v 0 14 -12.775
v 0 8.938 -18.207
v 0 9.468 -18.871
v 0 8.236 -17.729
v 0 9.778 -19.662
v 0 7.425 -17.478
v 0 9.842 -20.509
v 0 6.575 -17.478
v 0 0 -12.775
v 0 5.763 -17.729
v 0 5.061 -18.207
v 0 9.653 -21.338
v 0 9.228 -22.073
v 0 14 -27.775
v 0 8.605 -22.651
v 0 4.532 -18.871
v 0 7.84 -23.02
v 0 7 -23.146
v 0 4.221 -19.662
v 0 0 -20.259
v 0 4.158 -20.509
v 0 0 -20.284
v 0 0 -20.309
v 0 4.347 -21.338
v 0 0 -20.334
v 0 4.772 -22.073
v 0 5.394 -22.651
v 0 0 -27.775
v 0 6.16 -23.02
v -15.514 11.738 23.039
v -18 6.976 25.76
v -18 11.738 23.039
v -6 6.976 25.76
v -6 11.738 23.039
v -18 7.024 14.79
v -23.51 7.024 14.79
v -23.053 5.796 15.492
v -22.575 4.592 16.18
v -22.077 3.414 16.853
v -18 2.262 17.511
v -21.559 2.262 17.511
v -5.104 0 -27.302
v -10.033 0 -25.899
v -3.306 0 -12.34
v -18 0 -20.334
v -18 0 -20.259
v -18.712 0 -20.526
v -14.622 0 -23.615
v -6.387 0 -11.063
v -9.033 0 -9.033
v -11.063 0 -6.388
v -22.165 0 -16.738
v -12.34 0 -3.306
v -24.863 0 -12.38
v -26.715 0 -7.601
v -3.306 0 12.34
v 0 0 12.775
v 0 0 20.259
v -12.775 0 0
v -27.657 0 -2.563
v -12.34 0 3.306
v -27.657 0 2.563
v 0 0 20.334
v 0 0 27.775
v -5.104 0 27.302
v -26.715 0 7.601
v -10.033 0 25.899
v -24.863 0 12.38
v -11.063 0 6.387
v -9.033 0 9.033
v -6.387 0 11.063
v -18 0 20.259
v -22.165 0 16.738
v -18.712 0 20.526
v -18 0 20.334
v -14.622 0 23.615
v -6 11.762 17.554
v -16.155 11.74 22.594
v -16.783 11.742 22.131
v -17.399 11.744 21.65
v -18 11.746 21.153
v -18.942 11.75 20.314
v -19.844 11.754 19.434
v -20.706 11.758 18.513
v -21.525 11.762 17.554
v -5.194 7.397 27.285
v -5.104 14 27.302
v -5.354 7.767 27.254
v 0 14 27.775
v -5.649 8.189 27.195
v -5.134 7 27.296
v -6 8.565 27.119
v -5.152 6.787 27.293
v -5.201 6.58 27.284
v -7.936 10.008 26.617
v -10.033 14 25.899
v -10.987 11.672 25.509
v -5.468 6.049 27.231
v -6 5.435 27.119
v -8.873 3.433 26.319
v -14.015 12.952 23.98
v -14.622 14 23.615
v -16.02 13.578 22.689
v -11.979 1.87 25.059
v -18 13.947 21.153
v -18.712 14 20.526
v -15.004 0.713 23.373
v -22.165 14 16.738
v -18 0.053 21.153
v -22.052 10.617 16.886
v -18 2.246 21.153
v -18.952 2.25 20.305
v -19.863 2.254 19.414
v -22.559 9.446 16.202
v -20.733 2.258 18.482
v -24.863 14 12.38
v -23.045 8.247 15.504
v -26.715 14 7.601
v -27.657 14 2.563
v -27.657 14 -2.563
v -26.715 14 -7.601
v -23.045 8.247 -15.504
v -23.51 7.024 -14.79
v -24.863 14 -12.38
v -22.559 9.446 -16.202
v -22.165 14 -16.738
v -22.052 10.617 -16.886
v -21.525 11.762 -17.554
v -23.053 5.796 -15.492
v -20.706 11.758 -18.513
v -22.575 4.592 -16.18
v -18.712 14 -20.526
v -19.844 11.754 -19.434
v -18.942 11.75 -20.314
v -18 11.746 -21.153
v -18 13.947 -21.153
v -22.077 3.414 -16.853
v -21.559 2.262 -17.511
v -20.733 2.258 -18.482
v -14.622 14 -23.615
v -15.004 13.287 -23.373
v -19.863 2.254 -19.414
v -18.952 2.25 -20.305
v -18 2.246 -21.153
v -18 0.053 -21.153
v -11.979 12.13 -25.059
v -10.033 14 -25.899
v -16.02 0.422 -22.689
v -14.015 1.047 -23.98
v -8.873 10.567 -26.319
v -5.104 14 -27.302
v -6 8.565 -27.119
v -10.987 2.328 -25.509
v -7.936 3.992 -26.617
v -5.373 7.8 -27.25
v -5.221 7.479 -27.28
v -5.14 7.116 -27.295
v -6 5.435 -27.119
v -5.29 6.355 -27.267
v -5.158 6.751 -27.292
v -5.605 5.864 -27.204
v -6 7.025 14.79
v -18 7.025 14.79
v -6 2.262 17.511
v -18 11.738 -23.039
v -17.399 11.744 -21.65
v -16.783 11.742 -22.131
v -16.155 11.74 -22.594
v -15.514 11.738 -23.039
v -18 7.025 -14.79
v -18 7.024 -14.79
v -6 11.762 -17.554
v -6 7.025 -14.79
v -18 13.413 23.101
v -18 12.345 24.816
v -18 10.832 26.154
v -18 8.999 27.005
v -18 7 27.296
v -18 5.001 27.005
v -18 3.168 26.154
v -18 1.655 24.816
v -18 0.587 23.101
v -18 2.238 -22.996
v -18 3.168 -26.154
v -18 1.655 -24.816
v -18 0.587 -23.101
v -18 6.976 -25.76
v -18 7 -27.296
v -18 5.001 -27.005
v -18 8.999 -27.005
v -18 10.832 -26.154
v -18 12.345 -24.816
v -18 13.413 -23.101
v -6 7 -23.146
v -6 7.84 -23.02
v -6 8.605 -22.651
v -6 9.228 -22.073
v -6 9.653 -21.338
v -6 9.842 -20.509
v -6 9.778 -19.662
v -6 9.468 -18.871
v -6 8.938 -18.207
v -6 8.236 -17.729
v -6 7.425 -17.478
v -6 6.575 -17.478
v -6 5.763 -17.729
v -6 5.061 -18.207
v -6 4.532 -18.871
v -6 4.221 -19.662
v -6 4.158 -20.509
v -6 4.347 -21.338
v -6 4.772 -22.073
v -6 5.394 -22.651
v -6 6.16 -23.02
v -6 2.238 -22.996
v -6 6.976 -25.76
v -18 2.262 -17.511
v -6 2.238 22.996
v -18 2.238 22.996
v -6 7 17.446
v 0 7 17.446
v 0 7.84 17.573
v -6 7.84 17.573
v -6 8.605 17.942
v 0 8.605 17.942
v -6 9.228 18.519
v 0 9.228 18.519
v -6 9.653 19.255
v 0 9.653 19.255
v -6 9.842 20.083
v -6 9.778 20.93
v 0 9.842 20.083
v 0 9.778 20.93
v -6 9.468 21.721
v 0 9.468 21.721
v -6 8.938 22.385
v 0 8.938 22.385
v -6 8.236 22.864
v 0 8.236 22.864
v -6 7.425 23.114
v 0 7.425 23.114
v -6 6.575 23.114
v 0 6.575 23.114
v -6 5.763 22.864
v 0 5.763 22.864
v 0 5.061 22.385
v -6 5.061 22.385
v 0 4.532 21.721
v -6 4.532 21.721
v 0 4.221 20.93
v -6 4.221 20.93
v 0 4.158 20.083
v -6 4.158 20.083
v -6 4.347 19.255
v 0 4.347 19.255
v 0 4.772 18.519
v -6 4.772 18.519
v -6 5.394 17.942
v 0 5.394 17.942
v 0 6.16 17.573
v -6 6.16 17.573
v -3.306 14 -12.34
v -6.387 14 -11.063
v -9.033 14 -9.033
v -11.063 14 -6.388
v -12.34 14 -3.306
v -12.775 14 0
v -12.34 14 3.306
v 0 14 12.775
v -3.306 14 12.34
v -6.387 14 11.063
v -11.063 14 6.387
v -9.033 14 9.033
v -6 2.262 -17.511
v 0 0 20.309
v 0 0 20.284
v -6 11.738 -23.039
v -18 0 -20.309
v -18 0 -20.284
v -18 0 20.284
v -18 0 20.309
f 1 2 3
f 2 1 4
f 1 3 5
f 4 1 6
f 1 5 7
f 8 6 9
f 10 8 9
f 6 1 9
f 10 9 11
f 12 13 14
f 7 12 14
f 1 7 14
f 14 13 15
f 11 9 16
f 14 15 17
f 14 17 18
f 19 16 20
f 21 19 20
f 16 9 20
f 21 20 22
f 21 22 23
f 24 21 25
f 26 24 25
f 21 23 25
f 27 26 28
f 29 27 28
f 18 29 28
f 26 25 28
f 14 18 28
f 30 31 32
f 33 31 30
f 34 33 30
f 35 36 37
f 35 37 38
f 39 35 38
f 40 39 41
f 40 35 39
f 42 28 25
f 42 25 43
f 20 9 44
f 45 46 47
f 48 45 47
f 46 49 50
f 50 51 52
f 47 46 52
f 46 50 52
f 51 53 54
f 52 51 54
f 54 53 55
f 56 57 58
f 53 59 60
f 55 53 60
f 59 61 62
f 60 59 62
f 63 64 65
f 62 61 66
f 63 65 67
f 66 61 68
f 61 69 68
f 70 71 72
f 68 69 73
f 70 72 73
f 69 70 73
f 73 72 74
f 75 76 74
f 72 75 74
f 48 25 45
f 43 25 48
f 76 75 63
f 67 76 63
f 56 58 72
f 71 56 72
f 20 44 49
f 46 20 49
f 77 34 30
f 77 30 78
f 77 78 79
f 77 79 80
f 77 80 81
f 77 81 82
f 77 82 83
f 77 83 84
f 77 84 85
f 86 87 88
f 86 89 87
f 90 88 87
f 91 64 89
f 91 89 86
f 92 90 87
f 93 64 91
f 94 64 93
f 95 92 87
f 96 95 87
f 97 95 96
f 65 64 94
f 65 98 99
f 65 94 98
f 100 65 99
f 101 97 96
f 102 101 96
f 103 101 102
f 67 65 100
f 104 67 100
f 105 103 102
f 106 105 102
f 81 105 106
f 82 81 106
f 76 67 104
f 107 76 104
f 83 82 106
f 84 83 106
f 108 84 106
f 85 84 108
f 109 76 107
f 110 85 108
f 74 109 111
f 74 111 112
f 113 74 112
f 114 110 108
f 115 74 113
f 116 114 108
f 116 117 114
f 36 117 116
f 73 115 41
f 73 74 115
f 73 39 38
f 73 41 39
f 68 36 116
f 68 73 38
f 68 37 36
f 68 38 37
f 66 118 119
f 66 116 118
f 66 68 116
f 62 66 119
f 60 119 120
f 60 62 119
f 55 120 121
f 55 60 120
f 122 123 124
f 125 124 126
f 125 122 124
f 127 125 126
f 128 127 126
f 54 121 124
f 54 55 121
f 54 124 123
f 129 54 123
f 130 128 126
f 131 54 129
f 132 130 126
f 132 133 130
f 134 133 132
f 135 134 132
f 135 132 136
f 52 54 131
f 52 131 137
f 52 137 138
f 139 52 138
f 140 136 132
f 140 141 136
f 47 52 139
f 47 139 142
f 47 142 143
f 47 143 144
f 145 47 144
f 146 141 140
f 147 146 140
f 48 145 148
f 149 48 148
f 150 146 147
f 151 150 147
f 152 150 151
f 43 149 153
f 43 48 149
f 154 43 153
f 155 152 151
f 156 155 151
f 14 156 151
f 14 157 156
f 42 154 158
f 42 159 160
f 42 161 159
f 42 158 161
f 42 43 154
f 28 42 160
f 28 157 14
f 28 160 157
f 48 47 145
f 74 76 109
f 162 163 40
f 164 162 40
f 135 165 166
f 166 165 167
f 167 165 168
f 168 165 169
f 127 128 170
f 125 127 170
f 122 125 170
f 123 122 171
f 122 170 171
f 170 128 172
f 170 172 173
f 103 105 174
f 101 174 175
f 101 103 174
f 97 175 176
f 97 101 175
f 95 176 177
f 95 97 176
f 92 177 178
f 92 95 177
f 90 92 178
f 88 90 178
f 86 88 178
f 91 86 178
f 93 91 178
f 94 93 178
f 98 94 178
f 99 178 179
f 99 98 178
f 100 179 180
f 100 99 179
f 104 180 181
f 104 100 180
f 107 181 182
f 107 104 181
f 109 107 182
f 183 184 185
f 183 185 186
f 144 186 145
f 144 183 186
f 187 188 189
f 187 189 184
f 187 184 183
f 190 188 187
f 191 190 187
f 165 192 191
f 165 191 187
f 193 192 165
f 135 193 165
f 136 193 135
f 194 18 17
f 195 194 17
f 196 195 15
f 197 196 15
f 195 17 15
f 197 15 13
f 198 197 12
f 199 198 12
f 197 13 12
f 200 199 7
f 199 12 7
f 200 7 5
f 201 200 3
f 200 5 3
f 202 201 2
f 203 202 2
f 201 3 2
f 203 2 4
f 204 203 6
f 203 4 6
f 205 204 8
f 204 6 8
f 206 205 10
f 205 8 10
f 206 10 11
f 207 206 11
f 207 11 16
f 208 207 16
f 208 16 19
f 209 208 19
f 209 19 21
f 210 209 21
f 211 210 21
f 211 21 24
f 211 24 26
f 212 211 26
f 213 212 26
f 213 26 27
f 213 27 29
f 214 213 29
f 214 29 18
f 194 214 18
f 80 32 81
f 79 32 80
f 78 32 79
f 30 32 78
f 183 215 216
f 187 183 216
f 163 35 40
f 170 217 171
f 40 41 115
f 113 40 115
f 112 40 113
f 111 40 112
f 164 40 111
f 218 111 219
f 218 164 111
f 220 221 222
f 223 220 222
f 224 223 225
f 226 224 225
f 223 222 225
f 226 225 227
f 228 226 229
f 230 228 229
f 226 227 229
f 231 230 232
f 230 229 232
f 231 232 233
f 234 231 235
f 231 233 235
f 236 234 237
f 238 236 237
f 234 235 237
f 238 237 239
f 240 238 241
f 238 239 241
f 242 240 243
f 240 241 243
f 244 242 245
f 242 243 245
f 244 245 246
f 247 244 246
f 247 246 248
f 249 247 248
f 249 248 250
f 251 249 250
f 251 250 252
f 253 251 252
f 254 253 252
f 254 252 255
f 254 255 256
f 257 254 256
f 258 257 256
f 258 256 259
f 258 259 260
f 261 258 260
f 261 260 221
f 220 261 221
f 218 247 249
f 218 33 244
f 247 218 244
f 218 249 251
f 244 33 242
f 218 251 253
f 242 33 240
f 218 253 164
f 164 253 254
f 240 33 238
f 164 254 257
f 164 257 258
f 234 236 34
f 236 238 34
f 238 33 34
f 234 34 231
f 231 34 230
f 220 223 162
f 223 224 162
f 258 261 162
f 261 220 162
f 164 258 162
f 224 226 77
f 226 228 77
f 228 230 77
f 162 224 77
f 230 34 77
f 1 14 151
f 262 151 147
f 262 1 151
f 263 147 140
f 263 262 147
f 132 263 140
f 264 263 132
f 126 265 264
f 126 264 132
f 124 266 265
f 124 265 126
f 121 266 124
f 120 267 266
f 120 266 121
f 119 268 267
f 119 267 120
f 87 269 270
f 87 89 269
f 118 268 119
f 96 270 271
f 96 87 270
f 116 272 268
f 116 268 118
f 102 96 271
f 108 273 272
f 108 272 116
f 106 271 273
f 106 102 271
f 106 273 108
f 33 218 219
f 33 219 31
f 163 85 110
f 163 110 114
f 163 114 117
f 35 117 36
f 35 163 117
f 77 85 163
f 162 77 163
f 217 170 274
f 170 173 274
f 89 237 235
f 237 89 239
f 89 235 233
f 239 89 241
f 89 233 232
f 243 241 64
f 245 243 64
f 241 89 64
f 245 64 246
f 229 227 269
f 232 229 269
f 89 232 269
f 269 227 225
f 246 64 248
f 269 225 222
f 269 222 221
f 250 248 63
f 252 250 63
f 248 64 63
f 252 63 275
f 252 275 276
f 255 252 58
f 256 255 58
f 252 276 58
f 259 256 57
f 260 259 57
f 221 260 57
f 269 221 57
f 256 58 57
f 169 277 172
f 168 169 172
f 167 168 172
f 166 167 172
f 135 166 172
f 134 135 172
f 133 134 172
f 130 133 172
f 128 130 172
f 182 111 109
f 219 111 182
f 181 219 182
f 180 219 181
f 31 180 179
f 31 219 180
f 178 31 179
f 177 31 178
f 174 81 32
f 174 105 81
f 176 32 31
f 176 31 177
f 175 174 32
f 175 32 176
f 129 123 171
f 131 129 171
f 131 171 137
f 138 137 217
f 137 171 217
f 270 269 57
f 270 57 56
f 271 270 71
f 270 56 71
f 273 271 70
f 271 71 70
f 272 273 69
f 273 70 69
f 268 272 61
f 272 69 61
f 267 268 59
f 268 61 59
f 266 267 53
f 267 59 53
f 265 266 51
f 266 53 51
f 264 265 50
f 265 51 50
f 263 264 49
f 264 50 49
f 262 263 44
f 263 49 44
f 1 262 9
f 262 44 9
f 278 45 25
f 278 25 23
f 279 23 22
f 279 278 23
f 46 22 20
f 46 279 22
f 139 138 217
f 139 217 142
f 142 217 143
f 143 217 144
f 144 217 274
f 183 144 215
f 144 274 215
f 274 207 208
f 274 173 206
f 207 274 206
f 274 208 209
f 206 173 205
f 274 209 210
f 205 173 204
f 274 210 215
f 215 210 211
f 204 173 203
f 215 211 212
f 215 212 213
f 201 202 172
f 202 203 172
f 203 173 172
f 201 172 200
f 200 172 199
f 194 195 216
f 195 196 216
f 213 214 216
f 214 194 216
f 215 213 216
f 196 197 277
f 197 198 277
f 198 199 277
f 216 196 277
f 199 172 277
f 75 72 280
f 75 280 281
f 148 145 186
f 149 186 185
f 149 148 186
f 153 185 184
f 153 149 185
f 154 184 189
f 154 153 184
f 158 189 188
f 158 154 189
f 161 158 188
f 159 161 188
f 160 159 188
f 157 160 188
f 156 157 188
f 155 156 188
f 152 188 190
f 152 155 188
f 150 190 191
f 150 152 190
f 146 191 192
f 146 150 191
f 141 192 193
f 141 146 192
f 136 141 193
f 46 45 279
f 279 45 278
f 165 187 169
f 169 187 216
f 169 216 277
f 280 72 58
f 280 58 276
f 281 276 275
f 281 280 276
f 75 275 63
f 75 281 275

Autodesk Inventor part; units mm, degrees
ref_plane "YZ Plane" through (0, 0, 0) normal (1, 0, 0) x (0, 1, 0)
ref_plane "XZ Plane" through (0, 0, 0) normal (0, 1, 0) x (-1, 0, 0)
ref_plane "XY Plane" through (0, 0, 0) normal (0, 0, 1) x (1, 0, 0)
sketch "Sketch1" plane through (0, 0, 0) normal (0, 1, 0) x (-1, 0, 0)
  point P0 (0, 0)
sketch "Sketch2" plane through (0, 0, 0) normal (0, 1, 0) x (-1, 0, 0)
  arc A0 (0, -12.775) -> (0, 12.775) centre (0, 0) ccw
  arc A1 (0, -27.775) -> (0, 27.775) centre (0, 0) ccw
  line L0 (0, 27.775) -> (0, -27.775)
  dimension "d0" = 25.55
  dimension "d1" = 15
extrude "Extrusion1" add sketch "Sketch2" along normal blind 14 contours A0 L0 A1
sketch "Sketch4" plane through (0, 0, 27.775) normal (1, 0, 0) x (0, 0, -1)
  line L0 (4.7364, 11.7377) -> (10.2211, 11.7622)
  line L1 (10.2211, 11.7622) -> (12.9848, 7.0245)
  line L2 (12.9848, 7.0245) -> (10.2636, 2.2623)
  line L3 (10.2636, 2.2623) -> (4.7789, 2.2378)
  line L4 (4.7789, 2.2378) -> (2.0152, 6.9755)
  line L5 (2.0152, 6.9755) -> (4.7364, 11.7377)
  line L6 (0, 14) -> (15, 14) projected
  line L7 (0, 0) -> (0, 14) projected
  line L8 (15, 14) -> (40.55, 14) projected
  line L9 (27.775, 14) -> (27.775, 0)
  line L10 (50.8136, 11.7377) -> (45.3289, 11.7622)
  line L11 (45.3289, 11.7622) -> (42.5652, 7.0245)
  line L12 (42.5652, 7.0245) -> (45.2864, 2.2623)
  line L13 (45.2864, 2.2623) -> (50.7711, 2.2378)
  line L14 (50.7711, 2.2378) -> (53.5348, 6.9755)
  line L15 (53.5348, 6.9755) -> (50.8136, 11.7377)
  line L16 (55.55, 14) -> (40.55, 14)
  line L17 (55.55, 0) -> (55.55, 14)
  line L18 (40.55, 14) -> (15, 14)
  point P0 (7.5, 7)
  point P1 (7.4787, 11.75)
  point P2 (7.5, 14)
  point P3 (0, 7)
  point P4 (48.05, 7)
  point P5 (48.0713, 11.75)
  point P6 (48.05, 14)
  point P7 (55.55, 7)
  dimension "d5" = 9.5
  dimension "d6" = 0
  dimension "d7" = 0
extrude "Extrusion2" cut sketch "Sketch4" against normal through all
sketch "Sketch5" plane through (0, 0, 27.775) normal (1, 0, 0) x (0, 0, -1)
  line L0 (4.7364, 11.7377) -> (10.2211, 11.7622) projected
  circle A0 centre (7.4787, 6.9999) radius 2.85
  line L1 (0.8522, 11.9261) -> (14.3606, 11.9261)
  line L2 (14.3606, 11.9261) -> (14.3606, 2.2036)
  line L3 (14.3606, 2.2036) -> (0.8522, 2.2036)
  line L4 (0.8522, 2.2036) -> (0.8522, 11.9261)
  line L5 (10.2636, 2.2623) -> (4.7789, 2.2378) projected
  line L6 (55.55, 14) -> (0, 14) projected
  line L7 (27.775, 14) -> (27.775, 0)
  line L8 (55.55, 0) -> (0, 0) projected
  line L9 (50.8136, 11.7377) -> (45.3289, 11.7622)
  circle A1 centre (48.0713, 6.9999) radius 2.85
  line L10 (54.6978, 11.9261) -> (41.1894, 11.9261)
  line L11 (41.1894, 11.9261) -> (41.1894, 2.2036)
  line L12 (41.1894, 2.2036) -> (54.6978, 2.2036)
  line L13 (54.6978, 2.2036) -> (54.6978, 11.9261)
  line L14 (45.2864, 2.2623) -> (50.7711, 2.2378)
  point P0 (7.4787, 11.75)
  point P1 (7.4787, 11.75)
  point P2 (48.0713, 11.75)
  point P3 (48.0713, 11.75)
  dimension "d12" = 5.7
  dimension "d13" = 0
  dimension "d14" = 4.75
extrude "Extrusion3" add sketch "Sketch5" against normal blind 6
sketch "Sketch6" plane through (-6, 0, 27.775) normal (-1, 0, 0) x (0, 0, 1)
  line L0 (-27.775, 0) -> (-27.775, 14)
  line L1 (-40.55, 14) -> (-15, 14) projected
  line L2 (-10.2636, 2.2623) -> (-4.7789, 2.2378) projected
  line L3 (-10.2636, 2.2623) -> (-4.7789, 2.2378)
  line L4 (-4.7789, 2.2378) -> (-2.0152, 6.9755) projected
  line L5 (-4.7789, 2.2378) -> (-2.0152, 6.9755)
  line L6 (-2.0152, 6.9755) -> (-4.7364, 11.7377) projected
  line L7 (-2.0152, 6.9755) -> (-4.7364, 11.7377)
  line L8 (-4.7364, 11.7377) -> (-10.2636, 11.7624)
  line L9 (-10.2636, 11.7624) -> (-13.0059, 7.0615)
  line L10 (-13.0059, 7.0615) -> (-10.2636, 2.2623)
  circle A0 centre (-7.4787, 6.9999) radius 2.85 projected
  circle A1 centre (-7.4787, 6.9999) radius 7
  line L11 (-45.2864, 2.2623) -> (-50.7711, 2.2378)
  line L12 (-45.2864, 2.2623) -> (-50.7711, 2.2378)
  line L13 (-50.7711, 2.2378) -> (-53.5348, 6.9755)
  line L14 (-50.7711, 2.2378) -> (-53.5348, 6.9755)
  line L15 (-53.5348, 6.9755) -> (-50.8136, 11.7377)
  line L16 (-53.5348, 6.9755) -> (-50.8136, 11.7377)
  line L17 (-50.8136, 11.7377) -> (-45.2864, 11.7624)
  line L18 (-45.2864, 11.7624) -> (-42.5441, 7.0615)
  line L19 (-42.5441, 7.0615) -> (-45.2864, 2.2623)
  circle A2 centre (-48.0713, 6.9999) radius 2.85
  circle A3 centre (-48.0713, 6.9999) radius 7
  dimension "d17" = 14
extrude "Extrusion4" add sketch "Sketch6" along normal blind 12 and the other way blind 6 contours A1 | A3
properties part number "clamp_bolt"
